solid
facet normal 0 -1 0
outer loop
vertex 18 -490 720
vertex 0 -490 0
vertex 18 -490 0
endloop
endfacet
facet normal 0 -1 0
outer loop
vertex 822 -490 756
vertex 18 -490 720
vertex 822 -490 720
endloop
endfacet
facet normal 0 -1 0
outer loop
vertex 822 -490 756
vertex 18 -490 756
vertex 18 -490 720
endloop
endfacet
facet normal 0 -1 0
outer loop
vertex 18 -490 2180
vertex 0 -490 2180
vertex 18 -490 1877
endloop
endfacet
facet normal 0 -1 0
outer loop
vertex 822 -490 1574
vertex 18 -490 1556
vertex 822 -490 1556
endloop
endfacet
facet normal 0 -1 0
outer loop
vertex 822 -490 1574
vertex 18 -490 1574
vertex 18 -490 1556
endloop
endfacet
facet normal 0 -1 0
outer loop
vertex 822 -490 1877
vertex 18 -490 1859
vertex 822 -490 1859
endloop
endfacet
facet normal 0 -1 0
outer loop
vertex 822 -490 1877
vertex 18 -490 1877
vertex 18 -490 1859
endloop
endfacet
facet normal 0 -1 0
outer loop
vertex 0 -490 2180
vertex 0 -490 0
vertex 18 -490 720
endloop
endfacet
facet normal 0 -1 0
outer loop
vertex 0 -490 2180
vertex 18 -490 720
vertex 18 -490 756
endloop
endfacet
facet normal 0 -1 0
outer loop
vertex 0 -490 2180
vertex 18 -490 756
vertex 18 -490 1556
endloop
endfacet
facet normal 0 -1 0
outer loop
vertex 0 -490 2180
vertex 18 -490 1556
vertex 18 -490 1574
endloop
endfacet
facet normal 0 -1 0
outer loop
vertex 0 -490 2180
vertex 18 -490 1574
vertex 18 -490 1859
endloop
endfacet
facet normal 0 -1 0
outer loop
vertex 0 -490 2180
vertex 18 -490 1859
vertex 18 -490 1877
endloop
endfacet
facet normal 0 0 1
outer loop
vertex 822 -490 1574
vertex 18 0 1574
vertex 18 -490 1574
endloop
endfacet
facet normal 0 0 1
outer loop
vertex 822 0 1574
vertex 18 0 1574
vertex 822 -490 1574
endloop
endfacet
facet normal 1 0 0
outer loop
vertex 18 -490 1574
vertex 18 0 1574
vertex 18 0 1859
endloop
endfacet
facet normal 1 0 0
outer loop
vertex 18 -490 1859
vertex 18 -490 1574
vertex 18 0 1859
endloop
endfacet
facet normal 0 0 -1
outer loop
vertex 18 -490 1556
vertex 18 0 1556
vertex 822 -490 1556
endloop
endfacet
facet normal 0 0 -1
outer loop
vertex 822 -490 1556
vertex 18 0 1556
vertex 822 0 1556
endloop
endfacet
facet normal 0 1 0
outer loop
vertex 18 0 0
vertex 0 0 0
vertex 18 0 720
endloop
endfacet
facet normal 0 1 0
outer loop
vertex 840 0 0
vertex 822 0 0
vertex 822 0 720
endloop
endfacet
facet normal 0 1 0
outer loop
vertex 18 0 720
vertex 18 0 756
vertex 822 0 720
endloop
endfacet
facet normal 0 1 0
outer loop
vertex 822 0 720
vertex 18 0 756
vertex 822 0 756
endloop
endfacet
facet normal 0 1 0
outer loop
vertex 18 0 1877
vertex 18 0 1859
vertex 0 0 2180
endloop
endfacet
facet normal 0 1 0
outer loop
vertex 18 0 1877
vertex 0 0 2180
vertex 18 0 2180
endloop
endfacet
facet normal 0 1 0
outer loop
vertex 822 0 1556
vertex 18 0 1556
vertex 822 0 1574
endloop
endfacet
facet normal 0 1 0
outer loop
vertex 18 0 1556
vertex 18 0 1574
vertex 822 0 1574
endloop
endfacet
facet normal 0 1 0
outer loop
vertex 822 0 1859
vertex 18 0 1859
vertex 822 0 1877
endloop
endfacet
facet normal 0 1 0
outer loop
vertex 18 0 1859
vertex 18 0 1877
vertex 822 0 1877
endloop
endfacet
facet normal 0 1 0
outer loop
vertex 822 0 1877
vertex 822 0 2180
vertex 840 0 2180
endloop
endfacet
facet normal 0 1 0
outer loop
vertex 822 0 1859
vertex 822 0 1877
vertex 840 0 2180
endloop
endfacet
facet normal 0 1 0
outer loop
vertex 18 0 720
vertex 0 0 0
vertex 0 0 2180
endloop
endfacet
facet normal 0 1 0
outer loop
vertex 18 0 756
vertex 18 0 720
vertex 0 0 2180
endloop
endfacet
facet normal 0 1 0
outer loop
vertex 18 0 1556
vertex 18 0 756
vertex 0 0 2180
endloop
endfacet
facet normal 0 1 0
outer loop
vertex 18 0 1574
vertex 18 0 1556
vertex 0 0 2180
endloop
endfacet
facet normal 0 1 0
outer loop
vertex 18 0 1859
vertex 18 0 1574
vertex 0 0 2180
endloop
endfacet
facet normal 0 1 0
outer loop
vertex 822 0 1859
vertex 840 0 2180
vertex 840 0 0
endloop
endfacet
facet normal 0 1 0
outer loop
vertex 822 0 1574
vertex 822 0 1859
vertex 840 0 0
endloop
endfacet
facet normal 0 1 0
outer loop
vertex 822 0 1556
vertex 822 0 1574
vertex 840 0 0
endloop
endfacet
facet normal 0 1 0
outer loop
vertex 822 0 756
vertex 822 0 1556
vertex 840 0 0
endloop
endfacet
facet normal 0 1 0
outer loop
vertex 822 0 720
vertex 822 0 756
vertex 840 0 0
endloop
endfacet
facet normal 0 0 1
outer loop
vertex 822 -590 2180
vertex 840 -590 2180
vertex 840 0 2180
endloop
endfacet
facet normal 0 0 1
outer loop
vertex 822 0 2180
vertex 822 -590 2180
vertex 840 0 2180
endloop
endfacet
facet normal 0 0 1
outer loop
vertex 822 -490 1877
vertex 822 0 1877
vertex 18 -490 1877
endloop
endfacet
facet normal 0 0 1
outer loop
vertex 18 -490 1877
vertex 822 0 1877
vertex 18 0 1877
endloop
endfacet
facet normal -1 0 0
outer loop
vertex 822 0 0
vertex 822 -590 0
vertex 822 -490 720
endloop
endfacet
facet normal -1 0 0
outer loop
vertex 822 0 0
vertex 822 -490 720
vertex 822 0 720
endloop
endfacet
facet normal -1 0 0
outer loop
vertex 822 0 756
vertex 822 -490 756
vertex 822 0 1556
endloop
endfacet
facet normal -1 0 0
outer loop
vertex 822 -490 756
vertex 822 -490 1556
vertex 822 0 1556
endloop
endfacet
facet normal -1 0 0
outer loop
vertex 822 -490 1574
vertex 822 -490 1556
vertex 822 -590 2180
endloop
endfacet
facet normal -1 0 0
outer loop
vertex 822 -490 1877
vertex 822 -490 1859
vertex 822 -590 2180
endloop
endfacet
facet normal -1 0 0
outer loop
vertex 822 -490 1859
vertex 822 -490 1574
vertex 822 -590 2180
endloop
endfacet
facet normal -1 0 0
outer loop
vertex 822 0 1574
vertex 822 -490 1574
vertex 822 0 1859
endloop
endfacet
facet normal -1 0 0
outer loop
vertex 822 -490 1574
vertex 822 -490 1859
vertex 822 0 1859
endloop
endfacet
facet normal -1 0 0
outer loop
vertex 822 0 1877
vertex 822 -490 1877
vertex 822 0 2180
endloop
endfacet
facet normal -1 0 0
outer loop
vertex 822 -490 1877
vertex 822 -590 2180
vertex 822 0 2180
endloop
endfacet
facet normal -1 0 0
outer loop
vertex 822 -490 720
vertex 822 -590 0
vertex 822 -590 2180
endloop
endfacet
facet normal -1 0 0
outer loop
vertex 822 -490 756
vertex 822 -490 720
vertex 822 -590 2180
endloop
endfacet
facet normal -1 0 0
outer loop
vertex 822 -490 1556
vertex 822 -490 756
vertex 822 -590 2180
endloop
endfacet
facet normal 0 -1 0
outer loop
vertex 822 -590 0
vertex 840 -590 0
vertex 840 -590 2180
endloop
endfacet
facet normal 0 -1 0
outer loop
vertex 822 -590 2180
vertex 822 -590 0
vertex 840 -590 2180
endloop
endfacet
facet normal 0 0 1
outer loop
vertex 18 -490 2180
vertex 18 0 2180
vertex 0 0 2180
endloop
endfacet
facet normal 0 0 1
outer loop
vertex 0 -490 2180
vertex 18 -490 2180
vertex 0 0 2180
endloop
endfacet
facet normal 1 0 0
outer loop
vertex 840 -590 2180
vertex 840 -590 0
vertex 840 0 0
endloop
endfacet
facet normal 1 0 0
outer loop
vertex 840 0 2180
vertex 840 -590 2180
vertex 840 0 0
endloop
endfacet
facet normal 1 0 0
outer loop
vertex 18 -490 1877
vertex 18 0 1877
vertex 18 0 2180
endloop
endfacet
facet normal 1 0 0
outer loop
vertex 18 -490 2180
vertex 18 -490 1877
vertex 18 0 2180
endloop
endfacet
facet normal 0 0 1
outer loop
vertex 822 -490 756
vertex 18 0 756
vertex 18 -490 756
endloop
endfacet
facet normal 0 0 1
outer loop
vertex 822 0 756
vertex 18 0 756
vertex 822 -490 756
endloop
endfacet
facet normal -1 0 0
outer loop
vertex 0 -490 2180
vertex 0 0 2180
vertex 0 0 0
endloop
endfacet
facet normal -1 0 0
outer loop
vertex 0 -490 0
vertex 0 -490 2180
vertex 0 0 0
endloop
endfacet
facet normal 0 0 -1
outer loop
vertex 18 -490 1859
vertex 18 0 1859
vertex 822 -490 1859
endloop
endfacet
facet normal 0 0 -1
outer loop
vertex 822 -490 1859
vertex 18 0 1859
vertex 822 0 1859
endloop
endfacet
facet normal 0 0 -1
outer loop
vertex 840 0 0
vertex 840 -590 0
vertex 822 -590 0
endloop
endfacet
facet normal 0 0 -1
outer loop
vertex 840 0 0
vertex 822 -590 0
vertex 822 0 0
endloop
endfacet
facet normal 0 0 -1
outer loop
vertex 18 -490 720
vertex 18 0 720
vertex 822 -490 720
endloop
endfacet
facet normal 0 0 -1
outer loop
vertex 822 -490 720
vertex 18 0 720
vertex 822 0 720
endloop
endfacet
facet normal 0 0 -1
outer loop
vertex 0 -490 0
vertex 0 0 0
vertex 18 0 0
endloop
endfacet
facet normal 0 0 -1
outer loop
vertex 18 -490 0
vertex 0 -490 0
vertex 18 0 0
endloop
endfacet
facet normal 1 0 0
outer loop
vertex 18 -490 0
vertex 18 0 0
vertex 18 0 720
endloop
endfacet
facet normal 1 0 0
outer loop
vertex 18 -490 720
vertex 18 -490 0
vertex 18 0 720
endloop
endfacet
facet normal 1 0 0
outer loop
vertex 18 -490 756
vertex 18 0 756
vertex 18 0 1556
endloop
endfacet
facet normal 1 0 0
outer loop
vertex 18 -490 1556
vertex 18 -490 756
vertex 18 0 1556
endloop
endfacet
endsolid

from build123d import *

# Parameters (mm, degrees)
F0_W     = 804
F0_H     = 800
F0_H_2   = 285
F1_DEPTH = 490
F2_W     = 100
F2_H     = 2180
F3_DEPTH = 18


with BuildPart() as f1:
    # F0 (on Front) → F1 (new body)
    with BuildSketch(Plane.XZ):
        Polygon((0, 2180), (0, 0), (18, 0), (18, 720), (822, 720), (822, 0), (840, 0), (840, 2180), (822, 2180), (822, 2162), (822, 1877), (18, 1877), (18, 2162), (18, 2180), align=None)
        with Locations((420, 1156)):
            Rectangle(F0_W, F0_H, mode=Mode.SUBTRACT)
        with Locations((420, 1716.5)):
            Rectangle(F0_W, F0_H_2, mode=Mode.SUBTRACT)
    extrude(amount=F1_DEPTH)

    # F2 (on face) → F3 (join)
    with BuildSketch(Plane.YZ.offset(840)):
        with Locations((-540, 1090)):
            Rectangle(F2_W, F2_H)
    extrude(amount=-F3_DEPTH)


solid = f1.part
